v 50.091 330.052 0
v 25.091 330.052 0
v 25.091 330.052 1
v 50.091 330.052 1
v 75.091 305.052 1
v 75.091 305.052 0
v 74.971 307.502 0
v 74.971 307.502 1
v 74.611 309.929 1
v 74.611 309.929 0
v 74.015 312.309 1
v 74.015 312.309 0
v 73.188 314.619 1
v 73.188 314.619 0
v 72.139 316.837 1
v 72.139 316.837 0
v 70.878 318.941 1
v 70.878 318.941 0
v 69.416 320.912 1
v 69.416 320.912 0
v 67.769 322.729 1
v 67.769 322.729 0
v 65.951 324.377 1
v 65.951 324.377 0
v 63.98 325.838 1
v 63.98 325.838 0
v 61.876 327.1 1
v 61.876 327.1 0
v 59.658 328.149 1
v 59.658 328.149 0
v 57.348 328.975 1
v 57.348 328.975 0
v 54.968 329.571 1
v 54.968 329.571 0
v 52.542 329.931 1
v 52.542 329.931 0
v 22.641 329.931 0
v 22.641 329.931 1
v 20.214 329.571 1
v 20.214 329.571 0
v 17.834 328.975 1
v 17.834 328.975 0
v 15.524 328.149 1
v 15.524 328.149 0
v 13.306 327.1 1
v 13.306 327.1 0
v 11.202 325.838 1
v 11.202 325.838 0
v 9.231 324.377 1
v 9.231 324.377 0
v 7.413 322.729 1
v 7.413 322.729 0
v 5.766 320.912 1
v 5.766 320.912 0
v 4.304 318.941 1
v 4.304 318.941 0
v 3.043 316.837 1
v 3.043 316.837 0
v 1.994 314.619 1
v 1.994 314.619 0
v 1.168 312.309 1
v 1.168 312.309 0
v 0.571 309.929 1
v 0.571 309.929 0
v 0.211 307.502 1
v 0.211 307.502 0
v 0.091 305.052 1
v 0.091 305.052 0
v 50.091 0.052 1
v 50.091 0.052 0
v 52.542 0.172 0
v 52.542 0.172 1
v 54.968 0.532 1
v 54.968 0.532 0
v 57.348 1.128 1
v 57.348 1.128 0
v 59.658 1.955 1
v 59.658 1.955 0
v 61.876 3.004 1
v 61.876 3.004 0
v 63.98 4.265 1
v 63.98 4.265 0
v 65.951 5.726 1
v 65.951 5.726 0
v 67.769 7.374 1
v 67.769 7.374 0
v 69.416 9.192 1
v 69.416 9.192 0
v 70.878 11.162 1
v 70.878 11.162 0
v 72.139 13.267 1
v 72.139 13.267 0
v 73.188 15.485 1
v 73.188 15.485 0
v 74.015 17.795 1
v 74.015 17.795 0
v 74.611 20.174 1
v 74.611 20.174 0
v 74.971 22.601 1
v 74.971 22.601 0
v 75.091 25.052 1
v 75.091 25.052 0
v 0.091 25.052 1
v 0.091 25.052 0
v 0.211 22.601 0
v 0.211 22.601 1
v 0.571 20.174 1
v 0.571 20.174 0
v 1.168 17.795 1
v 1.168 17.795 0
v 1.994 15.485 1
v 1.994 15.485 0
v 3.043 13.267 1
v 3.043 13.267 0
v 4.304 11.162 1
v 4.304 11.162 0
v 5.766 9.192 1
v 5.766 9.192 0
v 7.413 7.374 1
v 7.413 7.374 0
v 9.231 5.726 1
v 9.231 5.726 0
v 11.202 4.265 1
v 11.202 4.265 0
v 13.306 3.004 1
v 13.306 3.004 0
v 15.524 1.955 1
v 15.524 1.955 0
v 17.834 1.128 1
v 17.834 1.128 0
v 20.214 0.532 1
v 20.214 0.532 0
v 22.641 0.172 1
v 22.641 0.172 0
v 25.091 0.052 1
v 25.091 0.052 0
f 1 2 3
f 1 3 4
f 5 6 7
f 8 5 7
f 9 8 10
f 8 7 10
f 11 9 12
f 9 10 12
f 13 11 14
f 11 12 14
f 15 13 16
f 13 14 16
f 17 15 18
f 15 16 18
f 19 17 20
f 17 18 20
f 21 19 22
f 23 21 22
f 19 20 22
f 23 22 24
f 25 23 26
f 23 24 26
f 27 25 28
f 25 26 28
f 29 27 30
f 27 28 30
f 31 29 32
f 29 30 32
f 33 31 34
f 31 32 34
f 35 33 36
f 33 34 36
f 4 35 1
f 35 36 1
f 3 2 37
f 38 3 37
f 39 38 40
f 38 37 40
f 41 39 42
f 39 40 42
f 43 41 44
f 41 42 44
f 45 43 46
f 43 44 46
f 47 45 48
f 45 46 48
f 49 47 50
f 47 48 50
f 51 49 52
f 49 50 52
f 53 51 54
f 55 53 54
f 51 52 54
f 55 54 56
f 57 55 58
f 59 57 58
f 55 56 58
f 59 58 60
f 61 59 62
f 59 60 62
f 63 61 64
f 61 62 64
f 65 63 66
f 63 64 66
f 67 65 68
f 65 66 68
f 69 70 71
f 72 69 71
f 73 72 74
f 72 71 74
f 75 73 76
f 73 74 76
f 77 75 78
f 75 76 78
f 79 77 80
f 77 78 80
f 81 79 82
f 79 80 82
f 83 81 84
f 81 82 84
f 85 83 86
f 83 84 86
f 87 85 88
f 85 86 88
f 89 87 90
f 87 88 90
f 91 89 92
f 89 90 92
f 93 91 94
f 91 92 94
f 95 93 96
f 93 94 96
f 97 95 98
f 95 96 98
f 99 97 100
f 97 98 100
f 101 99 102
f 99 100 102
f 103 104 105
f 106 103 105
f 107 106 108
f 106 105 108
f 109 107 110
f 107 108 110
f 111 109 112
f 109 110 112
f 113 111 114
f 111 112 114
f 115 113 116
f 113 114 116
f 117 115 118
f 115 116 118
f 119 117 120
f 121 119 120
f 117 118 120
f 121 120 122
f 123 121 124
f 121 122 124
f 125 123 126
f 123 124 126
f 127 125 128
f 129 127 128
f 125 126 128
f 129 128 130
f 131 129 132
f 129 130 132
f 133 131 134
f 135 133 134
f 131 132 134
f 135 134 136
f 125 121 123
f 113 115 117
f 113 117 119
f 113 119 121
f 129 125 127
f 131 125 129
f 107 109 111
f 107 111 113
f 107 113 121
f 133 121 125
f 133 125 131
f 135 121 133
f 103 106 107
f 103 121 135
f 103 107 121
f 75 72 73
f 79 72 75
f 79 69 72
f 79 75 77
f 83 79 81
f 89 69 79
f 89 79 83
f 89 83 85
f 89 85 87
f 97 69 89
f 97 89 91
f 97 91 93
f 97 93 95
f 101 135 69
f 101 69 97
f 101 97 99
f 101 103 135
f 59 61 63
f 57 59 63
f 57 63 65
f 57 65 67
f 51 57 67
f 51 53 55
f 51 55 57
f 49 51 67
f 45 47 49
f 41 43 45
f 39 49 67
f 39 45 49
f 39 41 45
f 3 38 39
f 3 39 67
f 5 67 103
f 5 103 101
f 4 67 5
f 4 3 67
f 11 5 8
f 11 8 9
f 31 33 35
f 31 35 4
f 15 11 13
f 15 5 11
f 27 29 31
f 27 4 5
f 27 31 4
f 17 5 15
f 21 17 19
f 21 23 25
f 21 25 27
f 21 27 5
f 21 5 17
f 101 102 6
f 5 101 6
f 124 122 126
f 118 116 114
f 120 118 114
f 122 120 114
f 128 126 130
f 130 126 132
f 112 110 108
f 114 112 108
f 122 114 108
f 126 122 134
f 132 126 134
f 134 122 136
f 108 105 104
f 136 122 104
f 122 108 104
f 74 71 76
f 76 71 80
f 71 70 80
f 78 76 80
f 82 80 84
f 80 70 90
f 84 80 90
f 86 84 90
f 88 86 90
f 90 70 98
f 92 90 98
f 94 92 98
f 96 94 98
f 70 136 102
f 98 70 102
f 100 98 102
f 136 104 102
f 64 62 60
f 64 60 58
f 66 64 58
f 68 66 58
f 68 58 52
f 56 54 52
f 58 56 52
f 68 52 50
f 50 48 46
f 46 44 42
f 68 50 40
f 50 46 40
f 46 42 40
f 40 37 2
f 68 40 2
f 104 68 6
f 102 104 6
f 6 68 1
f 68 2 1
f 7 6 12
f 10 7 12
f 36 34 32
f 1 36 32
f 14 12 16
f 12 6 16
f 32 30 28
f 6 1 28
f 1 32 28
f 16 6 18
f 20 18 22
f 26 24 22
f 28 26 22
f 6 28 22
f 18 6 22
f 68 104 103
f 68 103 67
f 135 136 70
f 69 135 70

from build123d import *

# Parameters (mm, degrees)
F0_W     = 25
F0_H     = 280
F0_H_2   = 25
F1_DEPTH = 1


with BuildPart() as f1:
    # F0 (on Top) → F1 (new body)
    with BuildSketch(Plane.XY):
        with Locations((12.591098, 165.051688)):
            Rectangle(F0_W, F0_H)
        with Locations((37.591098, 165.051688)):
            Rectangle(F0_W, F0_H)
        with Locations((62.591098, 165.051688)):
            Rectangle(F0_W, F0_H)
        with BuildLine():
            Line((75.091098, 25.051688), (50.091098, 25.051688))
            Line((50.091098, 25.051688), (50.091098, 0.051688))
            ThreePointArc((50.091098, 0.051688), (67.768768, 7.374019), (75.091098, 25.051688))
        make_face()
        with Locations((37.591098, 12.551688)):
            Rectangle(F0_W, F0_H_2)
        with BuildLine():
            Line((25.091098, 0.051688), (25.091098, 25.051688))
            Line((25.091098, 25.051688), (0.091098, 25.051688))
            ThreePointArc((0.091098, 25.051688), (7.413429, 7.374019), (25.091098, 0.051688))
        make_face()
        with BuildLine():
            Line((0.091098, 305.051688), (25.091098, 305.051688))
            Line((25.091098, 305.051688), (25.091098, 330.051688))
            ThreePointArc((25.091098, 330.051688), (7.413429, 322.729358), (0.091098, 305.051688))
        make_face()
        with Locations((37.591098, 317.551688)):
            Rectangle(F0_W, F0_H_2)
        with BuildLine():
            Line((50.091098, 330.051688), (50.091098, 305.051688))
            Line((50.091098, 305.051688), (75.091098, 305.051688))
            ThreePointArc((75.091098, 305.051688), (67.768768, 322.729358), (50.091098, 330.051688))
        make_face()
    extrude(amount=F1_DEPTH)


solid = f1.part
